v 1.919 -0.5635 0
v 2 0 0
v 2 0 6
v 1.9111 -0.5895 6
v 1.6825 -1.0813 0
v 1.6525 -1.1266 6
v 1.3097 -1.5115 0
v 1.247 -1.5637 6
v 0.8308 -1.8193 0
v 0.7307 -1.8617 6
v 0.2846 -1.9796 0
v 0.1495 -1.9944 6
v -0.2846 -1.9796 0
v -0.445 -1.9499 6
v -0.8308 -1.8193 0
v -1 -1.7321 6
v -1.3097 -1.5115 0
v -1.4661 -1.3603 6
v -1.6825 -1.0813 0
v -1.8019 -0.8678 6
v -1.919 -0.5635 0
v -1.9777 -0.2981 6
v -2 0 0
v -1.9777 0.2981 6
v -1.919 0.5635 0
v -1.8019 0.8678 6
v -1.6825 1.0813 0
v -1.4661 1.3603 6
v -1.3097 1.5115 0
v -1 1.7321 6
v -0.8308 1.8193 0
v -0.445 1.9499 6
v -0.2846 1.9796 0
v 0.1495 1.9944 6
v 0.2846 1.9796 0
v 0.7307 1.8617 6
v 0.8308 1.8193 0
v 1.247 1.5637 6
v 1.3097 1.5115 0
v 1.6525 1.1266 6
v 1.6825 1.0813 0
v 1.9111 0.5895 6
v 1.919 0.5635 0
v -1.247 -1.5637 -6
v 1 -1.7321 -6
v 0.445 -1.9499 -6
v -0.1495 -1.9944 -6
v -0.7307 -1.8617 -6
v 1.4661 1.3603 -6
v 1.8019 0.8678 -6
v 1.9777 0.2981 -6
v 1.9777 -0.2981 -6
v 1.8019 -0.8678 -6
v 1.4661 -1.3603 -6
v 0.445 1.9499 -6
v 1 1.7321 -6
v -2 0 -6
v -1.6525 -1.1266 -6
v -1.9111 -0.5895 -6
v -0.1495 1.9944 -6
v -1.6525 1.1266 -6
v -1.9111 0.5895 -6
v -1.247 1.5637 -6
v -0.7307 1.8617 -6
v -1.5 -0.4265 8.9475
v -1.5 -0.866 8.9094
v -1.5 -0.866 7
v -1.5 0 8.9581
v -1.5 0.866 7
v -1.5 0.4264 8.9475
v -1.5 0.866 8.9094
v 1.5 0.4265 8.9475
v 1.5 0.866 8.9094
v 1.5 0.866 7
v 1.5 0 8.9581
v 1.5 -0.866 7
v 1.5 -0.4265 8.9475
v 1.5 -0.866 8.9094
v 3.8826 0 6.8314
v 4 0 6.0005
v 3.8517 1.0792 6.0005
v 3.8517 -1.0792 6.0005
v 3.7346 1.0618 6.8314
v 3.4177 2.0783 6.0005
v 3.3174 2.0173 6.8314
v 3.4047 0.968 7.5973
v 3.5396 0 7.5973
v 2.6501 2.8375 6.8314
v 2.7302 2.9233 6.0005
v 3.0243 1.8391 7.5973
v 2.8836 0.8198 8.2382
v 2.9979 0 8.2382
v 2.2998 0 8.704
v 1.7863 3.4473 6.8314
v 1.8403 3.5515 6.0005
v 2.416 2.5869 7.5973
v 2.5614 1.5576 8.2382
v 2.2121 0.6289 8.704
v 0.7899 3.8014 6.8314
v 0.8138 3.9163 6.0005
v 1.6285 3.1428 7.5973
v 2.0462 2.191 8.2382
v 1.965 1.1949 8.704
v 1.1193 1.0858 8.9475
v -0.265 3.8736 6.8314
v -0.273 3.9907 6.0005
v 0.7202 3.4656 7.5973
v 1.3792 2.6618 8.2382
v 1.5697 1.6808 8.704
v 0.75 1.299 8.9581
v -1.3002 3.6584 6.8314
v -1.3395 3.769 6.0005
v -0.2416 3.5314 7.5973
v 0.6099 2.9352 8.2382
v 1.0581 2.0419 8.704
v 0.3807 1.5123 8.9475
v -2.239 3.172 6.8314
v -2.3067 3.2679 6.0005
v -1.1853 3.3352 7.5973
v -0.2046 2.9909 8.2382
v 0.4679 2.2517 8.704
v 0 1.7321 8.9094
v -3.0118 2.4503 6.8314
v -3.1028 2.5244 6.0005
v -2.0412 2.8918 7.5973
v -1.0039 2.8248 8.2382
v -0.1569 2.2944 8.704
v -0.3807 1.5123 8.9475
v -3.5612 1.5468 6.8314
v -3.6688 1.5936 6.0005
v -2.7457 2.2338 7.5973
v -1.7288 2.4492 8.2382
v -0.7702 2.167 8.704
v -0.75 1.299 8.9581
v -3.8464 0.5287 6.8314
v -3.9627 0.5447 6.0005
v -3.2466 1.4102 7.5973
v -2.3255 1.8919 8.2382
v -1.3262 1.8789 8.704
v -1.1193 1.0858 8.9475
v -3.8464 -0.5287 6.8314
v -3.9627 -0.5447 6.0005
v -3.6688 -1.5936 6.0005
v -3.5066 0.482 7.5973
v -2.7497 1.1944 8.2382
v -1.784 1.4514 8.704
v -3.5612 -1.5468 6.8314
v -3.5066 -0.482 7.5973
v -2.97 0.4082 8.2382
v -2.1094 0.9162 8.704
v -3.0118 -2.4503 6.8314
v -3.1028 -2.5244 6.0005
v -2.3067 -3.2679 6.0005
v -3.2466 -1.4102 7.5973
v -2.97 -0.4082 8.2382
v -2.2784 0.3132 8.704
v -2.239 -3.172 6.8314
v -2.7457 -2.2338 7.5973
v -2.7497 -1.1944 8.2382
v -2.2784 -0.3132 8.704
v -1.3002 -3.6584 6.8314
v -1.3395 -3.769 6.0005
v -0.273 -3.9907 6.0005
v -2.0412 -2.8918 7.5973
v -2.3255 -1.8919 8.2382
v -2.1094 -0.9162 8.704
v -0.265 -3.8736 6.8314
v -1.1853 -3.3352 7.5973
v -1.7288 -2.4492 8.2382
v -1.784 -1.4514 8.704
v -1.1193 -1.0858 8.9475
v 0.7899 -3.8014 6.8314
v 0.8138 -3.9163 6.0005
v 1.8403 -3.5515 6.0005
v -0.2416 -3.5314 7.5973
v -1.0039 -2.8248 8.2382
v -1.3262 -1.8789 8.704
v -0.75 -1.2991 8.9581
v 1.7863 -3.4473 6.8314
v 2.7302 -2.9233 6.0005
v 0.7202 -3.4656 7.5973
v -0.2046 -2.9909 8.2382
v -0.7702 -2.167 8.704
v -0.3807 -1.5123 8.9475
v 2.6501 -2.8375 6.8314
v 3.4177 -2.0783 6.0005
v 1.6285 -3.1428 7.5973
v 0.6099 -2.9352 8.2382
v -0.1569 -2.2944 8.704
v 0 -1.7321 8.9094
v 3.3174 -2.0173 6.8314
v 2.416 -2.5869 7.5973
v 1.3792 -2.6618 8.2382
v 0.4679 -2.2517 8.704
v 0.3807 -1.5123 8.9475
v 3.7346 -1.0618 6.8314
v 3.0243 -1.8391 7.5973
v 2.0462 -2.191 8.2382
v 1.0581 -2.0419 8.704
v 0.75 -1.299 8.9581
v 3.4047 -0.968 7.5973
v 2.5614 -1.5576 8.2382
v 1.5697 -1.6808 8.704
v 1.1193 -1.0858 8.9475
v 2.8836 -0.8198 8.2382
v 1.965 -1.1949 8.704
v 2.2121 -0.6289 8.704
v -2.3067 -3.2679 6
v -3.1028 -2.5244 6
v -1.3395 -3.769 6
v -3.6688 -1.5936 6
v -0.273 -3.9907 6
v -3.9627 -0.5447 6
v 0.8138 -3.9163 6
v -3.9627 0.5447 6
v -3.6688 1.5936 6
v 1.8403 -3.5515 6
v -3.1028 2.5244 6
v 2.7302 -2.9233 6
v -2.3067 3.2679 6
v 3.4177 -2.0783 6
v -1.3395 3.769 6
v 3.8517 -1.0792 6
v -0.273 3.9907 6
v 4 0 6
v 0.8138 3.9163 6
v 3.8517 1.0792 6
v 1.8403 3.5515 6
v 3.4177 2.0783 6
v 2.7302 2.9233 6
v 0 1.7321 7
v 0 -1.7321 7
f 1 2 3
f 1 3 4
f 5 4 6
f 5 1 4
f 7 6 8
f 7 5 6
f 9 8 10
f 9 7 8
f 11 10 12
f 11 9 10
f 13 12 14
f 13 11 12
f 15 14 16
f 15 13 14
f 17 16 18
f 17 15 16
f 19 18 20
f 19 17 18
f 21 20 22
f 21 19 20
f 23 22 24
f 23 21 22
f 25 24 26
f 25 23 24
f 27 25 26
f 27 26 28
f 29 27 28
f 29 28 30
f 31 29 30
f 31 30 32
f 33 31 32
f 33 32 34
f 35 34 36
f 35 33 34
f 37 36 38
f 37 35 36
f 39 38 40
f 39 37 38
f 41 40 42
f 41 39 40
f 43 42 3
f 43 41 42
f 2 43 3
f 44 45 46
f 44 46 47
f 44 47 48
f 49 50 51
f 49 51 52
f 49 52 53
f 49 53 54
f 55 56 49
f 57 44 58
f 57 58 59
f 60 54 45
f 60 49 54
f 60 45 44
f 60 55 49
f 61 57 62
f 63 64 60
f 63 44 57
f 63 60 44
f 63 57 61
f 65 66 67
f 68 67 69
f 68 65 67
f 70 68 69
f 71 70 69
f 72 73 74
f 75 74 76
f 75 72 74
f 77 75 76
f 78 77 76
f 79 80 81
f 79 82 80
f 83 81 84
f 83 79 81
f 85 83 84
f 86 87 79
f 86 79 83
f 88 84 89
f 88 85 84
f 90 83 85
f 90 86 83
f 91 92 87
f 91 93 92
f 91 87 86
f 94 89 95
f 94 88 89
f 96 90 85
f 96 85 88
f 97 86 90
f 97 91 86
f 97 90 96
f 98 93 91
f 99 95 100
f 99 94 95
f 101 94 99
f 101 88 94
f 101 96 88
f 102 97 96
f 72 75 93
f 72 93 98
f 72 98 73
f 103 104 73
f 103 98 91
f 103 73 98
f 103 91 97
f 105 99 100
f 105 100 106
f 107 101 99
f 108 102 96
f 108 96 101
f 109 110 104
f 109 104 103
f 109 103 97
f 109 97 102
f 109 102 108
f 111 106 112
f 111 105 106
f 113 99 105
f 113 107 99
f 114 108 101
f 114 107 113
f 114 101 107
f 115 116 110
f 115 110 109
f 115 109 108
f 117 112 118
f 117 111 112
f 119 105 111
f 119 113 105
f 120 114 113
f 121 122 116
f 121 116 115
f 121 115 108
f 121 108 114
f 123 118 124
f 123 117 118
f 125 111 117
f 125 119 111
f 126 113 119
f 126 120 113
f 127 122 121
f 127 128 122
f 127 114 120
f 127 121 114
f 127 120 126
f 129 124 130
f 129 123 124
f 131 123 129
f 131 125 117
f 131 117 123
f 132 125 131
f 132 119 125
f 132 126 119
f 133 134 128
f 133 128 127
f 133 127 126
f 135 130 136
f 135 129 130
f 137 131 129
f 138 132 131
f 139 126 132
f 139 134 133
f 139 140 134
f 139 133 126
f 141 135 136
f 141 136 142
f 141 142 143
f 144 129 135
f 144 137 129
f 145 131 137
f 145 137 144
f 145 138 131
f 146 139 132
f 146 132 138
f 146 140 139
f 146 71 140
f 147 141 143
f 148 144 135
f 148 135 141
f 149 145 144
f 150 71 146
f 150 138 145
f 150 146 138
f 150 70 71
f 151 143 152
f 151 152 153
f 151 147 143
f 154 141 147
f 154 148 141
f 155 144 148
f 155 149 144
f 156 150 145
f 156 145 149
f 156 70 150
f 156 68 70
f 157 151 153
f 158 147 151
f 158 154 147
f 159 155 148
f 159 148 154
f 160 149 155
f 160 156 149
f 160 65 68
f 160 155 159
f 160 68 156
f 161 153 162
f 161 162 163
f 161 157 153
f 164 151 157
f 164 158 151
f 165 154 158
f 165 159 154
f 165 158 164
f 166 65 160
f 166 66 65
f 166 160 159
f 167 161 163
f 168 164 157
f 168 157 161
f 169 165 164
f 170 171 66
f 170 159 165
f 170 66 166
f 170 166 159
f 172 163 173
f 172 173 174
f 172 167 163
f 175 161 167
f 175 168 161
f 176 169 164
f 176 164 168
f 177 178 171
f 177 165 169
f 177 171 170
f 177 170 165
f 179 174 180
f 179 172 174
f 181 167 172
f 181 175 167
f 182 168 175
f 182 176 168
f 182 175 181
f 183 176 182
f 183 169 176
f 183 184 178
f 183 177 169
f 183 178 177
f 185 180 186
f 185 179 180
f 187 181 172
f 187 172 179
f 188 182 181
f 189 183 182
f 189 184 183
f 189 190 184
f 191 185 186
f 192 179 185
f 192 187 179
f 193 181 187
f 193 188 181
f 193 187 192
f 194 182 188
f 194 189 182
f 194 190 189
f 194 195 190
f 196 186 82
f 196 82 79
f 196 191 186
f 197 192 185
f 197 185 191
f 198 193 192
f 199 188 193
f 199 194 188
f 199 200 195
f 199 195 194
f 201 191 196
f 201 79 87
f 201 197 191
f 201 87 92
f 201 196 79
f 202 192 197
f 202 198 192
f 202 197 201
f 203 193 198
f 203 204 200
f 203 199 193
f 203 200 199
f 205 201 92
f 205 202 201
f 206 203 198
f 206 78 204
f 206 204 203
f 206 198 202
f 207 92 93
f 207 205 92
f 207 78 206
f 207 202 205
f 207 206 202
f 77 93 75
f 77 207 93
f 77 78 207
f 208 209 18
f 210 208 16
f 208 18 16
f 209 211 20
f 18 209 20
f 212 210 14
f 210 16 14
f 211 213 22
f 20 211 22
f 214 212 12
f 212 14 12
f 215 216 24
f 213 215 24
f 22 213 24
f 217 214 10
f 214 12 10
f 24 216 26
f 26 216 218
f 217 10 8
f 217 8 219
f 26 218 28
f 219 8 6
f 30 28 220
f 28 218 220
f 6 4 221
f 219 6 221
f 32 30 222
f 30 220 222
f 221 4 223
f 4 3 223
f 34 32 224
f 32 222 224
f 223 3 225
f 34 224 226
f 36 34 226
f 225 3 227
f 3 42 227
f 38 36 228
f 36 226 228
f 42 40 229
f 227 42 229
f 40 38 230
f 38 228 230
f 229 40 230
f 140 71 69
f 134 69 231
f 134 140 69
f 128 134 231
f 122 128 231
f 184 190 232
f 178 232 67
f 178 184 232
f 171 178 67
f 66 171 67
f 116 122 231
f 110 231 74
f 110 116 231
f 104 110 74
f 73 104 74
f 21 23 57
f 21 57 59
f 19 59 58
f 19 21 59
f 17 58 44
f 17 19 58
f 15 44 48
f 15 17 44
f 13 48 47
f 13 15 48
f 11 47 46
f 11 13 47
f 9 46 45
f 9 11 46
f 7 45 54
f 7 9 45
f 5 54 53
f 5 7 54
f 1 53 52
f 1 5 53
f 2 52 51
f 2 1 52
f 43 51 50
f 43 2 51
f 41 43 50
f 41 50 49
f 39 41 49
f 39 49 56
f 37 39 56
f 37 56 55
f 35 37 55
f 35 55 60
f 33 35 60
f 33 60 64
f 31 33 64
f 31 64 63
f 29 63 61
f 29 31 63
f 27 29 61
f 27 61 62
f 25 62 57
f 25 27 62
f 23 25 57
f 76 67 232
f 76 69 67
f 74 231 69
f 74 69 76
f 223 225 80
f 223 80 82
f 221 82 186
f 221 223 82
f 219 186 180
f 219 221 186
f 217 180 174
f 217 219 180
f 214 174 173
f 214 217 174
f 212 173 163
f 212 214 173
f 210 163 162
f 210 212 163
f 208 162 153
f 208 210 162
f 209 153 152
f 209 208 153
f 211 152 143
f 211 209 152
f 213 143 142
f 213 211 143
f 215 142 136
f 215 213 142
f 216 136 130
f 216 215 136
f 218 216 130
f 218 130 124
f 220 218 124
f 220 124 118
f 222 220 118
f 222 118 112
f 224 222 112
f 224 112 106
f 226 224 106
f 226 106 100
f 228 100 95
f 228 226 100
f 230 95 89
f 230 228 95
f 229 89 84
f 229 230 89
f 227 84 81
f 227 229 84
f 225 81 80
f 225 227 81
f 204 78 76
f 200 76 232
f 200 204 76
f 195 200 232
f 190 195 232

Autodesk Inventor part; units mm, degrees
ref_plane "YZ Plane" through (0, 0, 0) normal (1, 0, 0) x (0, 1, 0)
ref_plane "XZ Plane" through (0, 0, 0) normal (0, 1, 0) x (-1, 0, 0)
ref_plane "XY Plane" through (0, 0, 0) normal (0, 0, 1) x (1, 0, 0)
sketch "スケッチ1" plane through (0, 0, 0) normal (0, 0, 1) x (1, 0, 0)
  circle A0 centre (0, 0) radius 2
  dimension "d0" = 4
extrude "押し出し1" add sketch "スケッチ1" along normal blind 6
sketch "スケッチ2" plane through (0, 0, 6) normal (0, 0, 1) x (1, 0, 0)
  circle A0 centre (0, 0) radius 2 projected
  circle A1 centre (0, 0) radius 4
  dimension "d3" = 8
extrude "押し出し2" add sketch "スケッチ2" along normal blind 3 contours A0 | A1
fillet "フィレット1" radius 3 1 edges at (-4, 0, 9)
thread "ねじ1" size "M4x0.7" class "6g" standard "ANSI Metric M Profile" full length
sketch "スケッチ3" plane through (0, 0, 0) normal (0, 0, -1) x (-1, 0, 0)
  circle A0 centre (0, 0) radius 2
extrude "押し出し3" add sketch "スケッチ3" along normal blind 6
sketch "スケッチ4" plane through (0, 0, 9) normal (0, 0, 1) x (1, 0, 0)
  line L0 (-1.5, 0.866) -> (0, 1.7321)
  line L1 (0, 1.7321) -> (1.5, 0.866)
  line L2 (1.5, 0.866) -> (1.5, -0.866)
  line L3 (1.5, -0.866) -> (0, -1.7321)
  line L4 (0, -1.7321) -> (-1.5, -0.866)
  line L5 (-1.5, -0.866) -> (-1.5, 0.866)
  point P0 (0, 0)
  point P1 (0, 0)
  point P2 (-1.5, 0)
  dimension "d11" = 3
extrude "押し出し4" cut sketch "スケッチ4" against normal blind 2
properties part number "SB　M4 12mm なべネジ (1)" material "Stainless Steel, 440C"
